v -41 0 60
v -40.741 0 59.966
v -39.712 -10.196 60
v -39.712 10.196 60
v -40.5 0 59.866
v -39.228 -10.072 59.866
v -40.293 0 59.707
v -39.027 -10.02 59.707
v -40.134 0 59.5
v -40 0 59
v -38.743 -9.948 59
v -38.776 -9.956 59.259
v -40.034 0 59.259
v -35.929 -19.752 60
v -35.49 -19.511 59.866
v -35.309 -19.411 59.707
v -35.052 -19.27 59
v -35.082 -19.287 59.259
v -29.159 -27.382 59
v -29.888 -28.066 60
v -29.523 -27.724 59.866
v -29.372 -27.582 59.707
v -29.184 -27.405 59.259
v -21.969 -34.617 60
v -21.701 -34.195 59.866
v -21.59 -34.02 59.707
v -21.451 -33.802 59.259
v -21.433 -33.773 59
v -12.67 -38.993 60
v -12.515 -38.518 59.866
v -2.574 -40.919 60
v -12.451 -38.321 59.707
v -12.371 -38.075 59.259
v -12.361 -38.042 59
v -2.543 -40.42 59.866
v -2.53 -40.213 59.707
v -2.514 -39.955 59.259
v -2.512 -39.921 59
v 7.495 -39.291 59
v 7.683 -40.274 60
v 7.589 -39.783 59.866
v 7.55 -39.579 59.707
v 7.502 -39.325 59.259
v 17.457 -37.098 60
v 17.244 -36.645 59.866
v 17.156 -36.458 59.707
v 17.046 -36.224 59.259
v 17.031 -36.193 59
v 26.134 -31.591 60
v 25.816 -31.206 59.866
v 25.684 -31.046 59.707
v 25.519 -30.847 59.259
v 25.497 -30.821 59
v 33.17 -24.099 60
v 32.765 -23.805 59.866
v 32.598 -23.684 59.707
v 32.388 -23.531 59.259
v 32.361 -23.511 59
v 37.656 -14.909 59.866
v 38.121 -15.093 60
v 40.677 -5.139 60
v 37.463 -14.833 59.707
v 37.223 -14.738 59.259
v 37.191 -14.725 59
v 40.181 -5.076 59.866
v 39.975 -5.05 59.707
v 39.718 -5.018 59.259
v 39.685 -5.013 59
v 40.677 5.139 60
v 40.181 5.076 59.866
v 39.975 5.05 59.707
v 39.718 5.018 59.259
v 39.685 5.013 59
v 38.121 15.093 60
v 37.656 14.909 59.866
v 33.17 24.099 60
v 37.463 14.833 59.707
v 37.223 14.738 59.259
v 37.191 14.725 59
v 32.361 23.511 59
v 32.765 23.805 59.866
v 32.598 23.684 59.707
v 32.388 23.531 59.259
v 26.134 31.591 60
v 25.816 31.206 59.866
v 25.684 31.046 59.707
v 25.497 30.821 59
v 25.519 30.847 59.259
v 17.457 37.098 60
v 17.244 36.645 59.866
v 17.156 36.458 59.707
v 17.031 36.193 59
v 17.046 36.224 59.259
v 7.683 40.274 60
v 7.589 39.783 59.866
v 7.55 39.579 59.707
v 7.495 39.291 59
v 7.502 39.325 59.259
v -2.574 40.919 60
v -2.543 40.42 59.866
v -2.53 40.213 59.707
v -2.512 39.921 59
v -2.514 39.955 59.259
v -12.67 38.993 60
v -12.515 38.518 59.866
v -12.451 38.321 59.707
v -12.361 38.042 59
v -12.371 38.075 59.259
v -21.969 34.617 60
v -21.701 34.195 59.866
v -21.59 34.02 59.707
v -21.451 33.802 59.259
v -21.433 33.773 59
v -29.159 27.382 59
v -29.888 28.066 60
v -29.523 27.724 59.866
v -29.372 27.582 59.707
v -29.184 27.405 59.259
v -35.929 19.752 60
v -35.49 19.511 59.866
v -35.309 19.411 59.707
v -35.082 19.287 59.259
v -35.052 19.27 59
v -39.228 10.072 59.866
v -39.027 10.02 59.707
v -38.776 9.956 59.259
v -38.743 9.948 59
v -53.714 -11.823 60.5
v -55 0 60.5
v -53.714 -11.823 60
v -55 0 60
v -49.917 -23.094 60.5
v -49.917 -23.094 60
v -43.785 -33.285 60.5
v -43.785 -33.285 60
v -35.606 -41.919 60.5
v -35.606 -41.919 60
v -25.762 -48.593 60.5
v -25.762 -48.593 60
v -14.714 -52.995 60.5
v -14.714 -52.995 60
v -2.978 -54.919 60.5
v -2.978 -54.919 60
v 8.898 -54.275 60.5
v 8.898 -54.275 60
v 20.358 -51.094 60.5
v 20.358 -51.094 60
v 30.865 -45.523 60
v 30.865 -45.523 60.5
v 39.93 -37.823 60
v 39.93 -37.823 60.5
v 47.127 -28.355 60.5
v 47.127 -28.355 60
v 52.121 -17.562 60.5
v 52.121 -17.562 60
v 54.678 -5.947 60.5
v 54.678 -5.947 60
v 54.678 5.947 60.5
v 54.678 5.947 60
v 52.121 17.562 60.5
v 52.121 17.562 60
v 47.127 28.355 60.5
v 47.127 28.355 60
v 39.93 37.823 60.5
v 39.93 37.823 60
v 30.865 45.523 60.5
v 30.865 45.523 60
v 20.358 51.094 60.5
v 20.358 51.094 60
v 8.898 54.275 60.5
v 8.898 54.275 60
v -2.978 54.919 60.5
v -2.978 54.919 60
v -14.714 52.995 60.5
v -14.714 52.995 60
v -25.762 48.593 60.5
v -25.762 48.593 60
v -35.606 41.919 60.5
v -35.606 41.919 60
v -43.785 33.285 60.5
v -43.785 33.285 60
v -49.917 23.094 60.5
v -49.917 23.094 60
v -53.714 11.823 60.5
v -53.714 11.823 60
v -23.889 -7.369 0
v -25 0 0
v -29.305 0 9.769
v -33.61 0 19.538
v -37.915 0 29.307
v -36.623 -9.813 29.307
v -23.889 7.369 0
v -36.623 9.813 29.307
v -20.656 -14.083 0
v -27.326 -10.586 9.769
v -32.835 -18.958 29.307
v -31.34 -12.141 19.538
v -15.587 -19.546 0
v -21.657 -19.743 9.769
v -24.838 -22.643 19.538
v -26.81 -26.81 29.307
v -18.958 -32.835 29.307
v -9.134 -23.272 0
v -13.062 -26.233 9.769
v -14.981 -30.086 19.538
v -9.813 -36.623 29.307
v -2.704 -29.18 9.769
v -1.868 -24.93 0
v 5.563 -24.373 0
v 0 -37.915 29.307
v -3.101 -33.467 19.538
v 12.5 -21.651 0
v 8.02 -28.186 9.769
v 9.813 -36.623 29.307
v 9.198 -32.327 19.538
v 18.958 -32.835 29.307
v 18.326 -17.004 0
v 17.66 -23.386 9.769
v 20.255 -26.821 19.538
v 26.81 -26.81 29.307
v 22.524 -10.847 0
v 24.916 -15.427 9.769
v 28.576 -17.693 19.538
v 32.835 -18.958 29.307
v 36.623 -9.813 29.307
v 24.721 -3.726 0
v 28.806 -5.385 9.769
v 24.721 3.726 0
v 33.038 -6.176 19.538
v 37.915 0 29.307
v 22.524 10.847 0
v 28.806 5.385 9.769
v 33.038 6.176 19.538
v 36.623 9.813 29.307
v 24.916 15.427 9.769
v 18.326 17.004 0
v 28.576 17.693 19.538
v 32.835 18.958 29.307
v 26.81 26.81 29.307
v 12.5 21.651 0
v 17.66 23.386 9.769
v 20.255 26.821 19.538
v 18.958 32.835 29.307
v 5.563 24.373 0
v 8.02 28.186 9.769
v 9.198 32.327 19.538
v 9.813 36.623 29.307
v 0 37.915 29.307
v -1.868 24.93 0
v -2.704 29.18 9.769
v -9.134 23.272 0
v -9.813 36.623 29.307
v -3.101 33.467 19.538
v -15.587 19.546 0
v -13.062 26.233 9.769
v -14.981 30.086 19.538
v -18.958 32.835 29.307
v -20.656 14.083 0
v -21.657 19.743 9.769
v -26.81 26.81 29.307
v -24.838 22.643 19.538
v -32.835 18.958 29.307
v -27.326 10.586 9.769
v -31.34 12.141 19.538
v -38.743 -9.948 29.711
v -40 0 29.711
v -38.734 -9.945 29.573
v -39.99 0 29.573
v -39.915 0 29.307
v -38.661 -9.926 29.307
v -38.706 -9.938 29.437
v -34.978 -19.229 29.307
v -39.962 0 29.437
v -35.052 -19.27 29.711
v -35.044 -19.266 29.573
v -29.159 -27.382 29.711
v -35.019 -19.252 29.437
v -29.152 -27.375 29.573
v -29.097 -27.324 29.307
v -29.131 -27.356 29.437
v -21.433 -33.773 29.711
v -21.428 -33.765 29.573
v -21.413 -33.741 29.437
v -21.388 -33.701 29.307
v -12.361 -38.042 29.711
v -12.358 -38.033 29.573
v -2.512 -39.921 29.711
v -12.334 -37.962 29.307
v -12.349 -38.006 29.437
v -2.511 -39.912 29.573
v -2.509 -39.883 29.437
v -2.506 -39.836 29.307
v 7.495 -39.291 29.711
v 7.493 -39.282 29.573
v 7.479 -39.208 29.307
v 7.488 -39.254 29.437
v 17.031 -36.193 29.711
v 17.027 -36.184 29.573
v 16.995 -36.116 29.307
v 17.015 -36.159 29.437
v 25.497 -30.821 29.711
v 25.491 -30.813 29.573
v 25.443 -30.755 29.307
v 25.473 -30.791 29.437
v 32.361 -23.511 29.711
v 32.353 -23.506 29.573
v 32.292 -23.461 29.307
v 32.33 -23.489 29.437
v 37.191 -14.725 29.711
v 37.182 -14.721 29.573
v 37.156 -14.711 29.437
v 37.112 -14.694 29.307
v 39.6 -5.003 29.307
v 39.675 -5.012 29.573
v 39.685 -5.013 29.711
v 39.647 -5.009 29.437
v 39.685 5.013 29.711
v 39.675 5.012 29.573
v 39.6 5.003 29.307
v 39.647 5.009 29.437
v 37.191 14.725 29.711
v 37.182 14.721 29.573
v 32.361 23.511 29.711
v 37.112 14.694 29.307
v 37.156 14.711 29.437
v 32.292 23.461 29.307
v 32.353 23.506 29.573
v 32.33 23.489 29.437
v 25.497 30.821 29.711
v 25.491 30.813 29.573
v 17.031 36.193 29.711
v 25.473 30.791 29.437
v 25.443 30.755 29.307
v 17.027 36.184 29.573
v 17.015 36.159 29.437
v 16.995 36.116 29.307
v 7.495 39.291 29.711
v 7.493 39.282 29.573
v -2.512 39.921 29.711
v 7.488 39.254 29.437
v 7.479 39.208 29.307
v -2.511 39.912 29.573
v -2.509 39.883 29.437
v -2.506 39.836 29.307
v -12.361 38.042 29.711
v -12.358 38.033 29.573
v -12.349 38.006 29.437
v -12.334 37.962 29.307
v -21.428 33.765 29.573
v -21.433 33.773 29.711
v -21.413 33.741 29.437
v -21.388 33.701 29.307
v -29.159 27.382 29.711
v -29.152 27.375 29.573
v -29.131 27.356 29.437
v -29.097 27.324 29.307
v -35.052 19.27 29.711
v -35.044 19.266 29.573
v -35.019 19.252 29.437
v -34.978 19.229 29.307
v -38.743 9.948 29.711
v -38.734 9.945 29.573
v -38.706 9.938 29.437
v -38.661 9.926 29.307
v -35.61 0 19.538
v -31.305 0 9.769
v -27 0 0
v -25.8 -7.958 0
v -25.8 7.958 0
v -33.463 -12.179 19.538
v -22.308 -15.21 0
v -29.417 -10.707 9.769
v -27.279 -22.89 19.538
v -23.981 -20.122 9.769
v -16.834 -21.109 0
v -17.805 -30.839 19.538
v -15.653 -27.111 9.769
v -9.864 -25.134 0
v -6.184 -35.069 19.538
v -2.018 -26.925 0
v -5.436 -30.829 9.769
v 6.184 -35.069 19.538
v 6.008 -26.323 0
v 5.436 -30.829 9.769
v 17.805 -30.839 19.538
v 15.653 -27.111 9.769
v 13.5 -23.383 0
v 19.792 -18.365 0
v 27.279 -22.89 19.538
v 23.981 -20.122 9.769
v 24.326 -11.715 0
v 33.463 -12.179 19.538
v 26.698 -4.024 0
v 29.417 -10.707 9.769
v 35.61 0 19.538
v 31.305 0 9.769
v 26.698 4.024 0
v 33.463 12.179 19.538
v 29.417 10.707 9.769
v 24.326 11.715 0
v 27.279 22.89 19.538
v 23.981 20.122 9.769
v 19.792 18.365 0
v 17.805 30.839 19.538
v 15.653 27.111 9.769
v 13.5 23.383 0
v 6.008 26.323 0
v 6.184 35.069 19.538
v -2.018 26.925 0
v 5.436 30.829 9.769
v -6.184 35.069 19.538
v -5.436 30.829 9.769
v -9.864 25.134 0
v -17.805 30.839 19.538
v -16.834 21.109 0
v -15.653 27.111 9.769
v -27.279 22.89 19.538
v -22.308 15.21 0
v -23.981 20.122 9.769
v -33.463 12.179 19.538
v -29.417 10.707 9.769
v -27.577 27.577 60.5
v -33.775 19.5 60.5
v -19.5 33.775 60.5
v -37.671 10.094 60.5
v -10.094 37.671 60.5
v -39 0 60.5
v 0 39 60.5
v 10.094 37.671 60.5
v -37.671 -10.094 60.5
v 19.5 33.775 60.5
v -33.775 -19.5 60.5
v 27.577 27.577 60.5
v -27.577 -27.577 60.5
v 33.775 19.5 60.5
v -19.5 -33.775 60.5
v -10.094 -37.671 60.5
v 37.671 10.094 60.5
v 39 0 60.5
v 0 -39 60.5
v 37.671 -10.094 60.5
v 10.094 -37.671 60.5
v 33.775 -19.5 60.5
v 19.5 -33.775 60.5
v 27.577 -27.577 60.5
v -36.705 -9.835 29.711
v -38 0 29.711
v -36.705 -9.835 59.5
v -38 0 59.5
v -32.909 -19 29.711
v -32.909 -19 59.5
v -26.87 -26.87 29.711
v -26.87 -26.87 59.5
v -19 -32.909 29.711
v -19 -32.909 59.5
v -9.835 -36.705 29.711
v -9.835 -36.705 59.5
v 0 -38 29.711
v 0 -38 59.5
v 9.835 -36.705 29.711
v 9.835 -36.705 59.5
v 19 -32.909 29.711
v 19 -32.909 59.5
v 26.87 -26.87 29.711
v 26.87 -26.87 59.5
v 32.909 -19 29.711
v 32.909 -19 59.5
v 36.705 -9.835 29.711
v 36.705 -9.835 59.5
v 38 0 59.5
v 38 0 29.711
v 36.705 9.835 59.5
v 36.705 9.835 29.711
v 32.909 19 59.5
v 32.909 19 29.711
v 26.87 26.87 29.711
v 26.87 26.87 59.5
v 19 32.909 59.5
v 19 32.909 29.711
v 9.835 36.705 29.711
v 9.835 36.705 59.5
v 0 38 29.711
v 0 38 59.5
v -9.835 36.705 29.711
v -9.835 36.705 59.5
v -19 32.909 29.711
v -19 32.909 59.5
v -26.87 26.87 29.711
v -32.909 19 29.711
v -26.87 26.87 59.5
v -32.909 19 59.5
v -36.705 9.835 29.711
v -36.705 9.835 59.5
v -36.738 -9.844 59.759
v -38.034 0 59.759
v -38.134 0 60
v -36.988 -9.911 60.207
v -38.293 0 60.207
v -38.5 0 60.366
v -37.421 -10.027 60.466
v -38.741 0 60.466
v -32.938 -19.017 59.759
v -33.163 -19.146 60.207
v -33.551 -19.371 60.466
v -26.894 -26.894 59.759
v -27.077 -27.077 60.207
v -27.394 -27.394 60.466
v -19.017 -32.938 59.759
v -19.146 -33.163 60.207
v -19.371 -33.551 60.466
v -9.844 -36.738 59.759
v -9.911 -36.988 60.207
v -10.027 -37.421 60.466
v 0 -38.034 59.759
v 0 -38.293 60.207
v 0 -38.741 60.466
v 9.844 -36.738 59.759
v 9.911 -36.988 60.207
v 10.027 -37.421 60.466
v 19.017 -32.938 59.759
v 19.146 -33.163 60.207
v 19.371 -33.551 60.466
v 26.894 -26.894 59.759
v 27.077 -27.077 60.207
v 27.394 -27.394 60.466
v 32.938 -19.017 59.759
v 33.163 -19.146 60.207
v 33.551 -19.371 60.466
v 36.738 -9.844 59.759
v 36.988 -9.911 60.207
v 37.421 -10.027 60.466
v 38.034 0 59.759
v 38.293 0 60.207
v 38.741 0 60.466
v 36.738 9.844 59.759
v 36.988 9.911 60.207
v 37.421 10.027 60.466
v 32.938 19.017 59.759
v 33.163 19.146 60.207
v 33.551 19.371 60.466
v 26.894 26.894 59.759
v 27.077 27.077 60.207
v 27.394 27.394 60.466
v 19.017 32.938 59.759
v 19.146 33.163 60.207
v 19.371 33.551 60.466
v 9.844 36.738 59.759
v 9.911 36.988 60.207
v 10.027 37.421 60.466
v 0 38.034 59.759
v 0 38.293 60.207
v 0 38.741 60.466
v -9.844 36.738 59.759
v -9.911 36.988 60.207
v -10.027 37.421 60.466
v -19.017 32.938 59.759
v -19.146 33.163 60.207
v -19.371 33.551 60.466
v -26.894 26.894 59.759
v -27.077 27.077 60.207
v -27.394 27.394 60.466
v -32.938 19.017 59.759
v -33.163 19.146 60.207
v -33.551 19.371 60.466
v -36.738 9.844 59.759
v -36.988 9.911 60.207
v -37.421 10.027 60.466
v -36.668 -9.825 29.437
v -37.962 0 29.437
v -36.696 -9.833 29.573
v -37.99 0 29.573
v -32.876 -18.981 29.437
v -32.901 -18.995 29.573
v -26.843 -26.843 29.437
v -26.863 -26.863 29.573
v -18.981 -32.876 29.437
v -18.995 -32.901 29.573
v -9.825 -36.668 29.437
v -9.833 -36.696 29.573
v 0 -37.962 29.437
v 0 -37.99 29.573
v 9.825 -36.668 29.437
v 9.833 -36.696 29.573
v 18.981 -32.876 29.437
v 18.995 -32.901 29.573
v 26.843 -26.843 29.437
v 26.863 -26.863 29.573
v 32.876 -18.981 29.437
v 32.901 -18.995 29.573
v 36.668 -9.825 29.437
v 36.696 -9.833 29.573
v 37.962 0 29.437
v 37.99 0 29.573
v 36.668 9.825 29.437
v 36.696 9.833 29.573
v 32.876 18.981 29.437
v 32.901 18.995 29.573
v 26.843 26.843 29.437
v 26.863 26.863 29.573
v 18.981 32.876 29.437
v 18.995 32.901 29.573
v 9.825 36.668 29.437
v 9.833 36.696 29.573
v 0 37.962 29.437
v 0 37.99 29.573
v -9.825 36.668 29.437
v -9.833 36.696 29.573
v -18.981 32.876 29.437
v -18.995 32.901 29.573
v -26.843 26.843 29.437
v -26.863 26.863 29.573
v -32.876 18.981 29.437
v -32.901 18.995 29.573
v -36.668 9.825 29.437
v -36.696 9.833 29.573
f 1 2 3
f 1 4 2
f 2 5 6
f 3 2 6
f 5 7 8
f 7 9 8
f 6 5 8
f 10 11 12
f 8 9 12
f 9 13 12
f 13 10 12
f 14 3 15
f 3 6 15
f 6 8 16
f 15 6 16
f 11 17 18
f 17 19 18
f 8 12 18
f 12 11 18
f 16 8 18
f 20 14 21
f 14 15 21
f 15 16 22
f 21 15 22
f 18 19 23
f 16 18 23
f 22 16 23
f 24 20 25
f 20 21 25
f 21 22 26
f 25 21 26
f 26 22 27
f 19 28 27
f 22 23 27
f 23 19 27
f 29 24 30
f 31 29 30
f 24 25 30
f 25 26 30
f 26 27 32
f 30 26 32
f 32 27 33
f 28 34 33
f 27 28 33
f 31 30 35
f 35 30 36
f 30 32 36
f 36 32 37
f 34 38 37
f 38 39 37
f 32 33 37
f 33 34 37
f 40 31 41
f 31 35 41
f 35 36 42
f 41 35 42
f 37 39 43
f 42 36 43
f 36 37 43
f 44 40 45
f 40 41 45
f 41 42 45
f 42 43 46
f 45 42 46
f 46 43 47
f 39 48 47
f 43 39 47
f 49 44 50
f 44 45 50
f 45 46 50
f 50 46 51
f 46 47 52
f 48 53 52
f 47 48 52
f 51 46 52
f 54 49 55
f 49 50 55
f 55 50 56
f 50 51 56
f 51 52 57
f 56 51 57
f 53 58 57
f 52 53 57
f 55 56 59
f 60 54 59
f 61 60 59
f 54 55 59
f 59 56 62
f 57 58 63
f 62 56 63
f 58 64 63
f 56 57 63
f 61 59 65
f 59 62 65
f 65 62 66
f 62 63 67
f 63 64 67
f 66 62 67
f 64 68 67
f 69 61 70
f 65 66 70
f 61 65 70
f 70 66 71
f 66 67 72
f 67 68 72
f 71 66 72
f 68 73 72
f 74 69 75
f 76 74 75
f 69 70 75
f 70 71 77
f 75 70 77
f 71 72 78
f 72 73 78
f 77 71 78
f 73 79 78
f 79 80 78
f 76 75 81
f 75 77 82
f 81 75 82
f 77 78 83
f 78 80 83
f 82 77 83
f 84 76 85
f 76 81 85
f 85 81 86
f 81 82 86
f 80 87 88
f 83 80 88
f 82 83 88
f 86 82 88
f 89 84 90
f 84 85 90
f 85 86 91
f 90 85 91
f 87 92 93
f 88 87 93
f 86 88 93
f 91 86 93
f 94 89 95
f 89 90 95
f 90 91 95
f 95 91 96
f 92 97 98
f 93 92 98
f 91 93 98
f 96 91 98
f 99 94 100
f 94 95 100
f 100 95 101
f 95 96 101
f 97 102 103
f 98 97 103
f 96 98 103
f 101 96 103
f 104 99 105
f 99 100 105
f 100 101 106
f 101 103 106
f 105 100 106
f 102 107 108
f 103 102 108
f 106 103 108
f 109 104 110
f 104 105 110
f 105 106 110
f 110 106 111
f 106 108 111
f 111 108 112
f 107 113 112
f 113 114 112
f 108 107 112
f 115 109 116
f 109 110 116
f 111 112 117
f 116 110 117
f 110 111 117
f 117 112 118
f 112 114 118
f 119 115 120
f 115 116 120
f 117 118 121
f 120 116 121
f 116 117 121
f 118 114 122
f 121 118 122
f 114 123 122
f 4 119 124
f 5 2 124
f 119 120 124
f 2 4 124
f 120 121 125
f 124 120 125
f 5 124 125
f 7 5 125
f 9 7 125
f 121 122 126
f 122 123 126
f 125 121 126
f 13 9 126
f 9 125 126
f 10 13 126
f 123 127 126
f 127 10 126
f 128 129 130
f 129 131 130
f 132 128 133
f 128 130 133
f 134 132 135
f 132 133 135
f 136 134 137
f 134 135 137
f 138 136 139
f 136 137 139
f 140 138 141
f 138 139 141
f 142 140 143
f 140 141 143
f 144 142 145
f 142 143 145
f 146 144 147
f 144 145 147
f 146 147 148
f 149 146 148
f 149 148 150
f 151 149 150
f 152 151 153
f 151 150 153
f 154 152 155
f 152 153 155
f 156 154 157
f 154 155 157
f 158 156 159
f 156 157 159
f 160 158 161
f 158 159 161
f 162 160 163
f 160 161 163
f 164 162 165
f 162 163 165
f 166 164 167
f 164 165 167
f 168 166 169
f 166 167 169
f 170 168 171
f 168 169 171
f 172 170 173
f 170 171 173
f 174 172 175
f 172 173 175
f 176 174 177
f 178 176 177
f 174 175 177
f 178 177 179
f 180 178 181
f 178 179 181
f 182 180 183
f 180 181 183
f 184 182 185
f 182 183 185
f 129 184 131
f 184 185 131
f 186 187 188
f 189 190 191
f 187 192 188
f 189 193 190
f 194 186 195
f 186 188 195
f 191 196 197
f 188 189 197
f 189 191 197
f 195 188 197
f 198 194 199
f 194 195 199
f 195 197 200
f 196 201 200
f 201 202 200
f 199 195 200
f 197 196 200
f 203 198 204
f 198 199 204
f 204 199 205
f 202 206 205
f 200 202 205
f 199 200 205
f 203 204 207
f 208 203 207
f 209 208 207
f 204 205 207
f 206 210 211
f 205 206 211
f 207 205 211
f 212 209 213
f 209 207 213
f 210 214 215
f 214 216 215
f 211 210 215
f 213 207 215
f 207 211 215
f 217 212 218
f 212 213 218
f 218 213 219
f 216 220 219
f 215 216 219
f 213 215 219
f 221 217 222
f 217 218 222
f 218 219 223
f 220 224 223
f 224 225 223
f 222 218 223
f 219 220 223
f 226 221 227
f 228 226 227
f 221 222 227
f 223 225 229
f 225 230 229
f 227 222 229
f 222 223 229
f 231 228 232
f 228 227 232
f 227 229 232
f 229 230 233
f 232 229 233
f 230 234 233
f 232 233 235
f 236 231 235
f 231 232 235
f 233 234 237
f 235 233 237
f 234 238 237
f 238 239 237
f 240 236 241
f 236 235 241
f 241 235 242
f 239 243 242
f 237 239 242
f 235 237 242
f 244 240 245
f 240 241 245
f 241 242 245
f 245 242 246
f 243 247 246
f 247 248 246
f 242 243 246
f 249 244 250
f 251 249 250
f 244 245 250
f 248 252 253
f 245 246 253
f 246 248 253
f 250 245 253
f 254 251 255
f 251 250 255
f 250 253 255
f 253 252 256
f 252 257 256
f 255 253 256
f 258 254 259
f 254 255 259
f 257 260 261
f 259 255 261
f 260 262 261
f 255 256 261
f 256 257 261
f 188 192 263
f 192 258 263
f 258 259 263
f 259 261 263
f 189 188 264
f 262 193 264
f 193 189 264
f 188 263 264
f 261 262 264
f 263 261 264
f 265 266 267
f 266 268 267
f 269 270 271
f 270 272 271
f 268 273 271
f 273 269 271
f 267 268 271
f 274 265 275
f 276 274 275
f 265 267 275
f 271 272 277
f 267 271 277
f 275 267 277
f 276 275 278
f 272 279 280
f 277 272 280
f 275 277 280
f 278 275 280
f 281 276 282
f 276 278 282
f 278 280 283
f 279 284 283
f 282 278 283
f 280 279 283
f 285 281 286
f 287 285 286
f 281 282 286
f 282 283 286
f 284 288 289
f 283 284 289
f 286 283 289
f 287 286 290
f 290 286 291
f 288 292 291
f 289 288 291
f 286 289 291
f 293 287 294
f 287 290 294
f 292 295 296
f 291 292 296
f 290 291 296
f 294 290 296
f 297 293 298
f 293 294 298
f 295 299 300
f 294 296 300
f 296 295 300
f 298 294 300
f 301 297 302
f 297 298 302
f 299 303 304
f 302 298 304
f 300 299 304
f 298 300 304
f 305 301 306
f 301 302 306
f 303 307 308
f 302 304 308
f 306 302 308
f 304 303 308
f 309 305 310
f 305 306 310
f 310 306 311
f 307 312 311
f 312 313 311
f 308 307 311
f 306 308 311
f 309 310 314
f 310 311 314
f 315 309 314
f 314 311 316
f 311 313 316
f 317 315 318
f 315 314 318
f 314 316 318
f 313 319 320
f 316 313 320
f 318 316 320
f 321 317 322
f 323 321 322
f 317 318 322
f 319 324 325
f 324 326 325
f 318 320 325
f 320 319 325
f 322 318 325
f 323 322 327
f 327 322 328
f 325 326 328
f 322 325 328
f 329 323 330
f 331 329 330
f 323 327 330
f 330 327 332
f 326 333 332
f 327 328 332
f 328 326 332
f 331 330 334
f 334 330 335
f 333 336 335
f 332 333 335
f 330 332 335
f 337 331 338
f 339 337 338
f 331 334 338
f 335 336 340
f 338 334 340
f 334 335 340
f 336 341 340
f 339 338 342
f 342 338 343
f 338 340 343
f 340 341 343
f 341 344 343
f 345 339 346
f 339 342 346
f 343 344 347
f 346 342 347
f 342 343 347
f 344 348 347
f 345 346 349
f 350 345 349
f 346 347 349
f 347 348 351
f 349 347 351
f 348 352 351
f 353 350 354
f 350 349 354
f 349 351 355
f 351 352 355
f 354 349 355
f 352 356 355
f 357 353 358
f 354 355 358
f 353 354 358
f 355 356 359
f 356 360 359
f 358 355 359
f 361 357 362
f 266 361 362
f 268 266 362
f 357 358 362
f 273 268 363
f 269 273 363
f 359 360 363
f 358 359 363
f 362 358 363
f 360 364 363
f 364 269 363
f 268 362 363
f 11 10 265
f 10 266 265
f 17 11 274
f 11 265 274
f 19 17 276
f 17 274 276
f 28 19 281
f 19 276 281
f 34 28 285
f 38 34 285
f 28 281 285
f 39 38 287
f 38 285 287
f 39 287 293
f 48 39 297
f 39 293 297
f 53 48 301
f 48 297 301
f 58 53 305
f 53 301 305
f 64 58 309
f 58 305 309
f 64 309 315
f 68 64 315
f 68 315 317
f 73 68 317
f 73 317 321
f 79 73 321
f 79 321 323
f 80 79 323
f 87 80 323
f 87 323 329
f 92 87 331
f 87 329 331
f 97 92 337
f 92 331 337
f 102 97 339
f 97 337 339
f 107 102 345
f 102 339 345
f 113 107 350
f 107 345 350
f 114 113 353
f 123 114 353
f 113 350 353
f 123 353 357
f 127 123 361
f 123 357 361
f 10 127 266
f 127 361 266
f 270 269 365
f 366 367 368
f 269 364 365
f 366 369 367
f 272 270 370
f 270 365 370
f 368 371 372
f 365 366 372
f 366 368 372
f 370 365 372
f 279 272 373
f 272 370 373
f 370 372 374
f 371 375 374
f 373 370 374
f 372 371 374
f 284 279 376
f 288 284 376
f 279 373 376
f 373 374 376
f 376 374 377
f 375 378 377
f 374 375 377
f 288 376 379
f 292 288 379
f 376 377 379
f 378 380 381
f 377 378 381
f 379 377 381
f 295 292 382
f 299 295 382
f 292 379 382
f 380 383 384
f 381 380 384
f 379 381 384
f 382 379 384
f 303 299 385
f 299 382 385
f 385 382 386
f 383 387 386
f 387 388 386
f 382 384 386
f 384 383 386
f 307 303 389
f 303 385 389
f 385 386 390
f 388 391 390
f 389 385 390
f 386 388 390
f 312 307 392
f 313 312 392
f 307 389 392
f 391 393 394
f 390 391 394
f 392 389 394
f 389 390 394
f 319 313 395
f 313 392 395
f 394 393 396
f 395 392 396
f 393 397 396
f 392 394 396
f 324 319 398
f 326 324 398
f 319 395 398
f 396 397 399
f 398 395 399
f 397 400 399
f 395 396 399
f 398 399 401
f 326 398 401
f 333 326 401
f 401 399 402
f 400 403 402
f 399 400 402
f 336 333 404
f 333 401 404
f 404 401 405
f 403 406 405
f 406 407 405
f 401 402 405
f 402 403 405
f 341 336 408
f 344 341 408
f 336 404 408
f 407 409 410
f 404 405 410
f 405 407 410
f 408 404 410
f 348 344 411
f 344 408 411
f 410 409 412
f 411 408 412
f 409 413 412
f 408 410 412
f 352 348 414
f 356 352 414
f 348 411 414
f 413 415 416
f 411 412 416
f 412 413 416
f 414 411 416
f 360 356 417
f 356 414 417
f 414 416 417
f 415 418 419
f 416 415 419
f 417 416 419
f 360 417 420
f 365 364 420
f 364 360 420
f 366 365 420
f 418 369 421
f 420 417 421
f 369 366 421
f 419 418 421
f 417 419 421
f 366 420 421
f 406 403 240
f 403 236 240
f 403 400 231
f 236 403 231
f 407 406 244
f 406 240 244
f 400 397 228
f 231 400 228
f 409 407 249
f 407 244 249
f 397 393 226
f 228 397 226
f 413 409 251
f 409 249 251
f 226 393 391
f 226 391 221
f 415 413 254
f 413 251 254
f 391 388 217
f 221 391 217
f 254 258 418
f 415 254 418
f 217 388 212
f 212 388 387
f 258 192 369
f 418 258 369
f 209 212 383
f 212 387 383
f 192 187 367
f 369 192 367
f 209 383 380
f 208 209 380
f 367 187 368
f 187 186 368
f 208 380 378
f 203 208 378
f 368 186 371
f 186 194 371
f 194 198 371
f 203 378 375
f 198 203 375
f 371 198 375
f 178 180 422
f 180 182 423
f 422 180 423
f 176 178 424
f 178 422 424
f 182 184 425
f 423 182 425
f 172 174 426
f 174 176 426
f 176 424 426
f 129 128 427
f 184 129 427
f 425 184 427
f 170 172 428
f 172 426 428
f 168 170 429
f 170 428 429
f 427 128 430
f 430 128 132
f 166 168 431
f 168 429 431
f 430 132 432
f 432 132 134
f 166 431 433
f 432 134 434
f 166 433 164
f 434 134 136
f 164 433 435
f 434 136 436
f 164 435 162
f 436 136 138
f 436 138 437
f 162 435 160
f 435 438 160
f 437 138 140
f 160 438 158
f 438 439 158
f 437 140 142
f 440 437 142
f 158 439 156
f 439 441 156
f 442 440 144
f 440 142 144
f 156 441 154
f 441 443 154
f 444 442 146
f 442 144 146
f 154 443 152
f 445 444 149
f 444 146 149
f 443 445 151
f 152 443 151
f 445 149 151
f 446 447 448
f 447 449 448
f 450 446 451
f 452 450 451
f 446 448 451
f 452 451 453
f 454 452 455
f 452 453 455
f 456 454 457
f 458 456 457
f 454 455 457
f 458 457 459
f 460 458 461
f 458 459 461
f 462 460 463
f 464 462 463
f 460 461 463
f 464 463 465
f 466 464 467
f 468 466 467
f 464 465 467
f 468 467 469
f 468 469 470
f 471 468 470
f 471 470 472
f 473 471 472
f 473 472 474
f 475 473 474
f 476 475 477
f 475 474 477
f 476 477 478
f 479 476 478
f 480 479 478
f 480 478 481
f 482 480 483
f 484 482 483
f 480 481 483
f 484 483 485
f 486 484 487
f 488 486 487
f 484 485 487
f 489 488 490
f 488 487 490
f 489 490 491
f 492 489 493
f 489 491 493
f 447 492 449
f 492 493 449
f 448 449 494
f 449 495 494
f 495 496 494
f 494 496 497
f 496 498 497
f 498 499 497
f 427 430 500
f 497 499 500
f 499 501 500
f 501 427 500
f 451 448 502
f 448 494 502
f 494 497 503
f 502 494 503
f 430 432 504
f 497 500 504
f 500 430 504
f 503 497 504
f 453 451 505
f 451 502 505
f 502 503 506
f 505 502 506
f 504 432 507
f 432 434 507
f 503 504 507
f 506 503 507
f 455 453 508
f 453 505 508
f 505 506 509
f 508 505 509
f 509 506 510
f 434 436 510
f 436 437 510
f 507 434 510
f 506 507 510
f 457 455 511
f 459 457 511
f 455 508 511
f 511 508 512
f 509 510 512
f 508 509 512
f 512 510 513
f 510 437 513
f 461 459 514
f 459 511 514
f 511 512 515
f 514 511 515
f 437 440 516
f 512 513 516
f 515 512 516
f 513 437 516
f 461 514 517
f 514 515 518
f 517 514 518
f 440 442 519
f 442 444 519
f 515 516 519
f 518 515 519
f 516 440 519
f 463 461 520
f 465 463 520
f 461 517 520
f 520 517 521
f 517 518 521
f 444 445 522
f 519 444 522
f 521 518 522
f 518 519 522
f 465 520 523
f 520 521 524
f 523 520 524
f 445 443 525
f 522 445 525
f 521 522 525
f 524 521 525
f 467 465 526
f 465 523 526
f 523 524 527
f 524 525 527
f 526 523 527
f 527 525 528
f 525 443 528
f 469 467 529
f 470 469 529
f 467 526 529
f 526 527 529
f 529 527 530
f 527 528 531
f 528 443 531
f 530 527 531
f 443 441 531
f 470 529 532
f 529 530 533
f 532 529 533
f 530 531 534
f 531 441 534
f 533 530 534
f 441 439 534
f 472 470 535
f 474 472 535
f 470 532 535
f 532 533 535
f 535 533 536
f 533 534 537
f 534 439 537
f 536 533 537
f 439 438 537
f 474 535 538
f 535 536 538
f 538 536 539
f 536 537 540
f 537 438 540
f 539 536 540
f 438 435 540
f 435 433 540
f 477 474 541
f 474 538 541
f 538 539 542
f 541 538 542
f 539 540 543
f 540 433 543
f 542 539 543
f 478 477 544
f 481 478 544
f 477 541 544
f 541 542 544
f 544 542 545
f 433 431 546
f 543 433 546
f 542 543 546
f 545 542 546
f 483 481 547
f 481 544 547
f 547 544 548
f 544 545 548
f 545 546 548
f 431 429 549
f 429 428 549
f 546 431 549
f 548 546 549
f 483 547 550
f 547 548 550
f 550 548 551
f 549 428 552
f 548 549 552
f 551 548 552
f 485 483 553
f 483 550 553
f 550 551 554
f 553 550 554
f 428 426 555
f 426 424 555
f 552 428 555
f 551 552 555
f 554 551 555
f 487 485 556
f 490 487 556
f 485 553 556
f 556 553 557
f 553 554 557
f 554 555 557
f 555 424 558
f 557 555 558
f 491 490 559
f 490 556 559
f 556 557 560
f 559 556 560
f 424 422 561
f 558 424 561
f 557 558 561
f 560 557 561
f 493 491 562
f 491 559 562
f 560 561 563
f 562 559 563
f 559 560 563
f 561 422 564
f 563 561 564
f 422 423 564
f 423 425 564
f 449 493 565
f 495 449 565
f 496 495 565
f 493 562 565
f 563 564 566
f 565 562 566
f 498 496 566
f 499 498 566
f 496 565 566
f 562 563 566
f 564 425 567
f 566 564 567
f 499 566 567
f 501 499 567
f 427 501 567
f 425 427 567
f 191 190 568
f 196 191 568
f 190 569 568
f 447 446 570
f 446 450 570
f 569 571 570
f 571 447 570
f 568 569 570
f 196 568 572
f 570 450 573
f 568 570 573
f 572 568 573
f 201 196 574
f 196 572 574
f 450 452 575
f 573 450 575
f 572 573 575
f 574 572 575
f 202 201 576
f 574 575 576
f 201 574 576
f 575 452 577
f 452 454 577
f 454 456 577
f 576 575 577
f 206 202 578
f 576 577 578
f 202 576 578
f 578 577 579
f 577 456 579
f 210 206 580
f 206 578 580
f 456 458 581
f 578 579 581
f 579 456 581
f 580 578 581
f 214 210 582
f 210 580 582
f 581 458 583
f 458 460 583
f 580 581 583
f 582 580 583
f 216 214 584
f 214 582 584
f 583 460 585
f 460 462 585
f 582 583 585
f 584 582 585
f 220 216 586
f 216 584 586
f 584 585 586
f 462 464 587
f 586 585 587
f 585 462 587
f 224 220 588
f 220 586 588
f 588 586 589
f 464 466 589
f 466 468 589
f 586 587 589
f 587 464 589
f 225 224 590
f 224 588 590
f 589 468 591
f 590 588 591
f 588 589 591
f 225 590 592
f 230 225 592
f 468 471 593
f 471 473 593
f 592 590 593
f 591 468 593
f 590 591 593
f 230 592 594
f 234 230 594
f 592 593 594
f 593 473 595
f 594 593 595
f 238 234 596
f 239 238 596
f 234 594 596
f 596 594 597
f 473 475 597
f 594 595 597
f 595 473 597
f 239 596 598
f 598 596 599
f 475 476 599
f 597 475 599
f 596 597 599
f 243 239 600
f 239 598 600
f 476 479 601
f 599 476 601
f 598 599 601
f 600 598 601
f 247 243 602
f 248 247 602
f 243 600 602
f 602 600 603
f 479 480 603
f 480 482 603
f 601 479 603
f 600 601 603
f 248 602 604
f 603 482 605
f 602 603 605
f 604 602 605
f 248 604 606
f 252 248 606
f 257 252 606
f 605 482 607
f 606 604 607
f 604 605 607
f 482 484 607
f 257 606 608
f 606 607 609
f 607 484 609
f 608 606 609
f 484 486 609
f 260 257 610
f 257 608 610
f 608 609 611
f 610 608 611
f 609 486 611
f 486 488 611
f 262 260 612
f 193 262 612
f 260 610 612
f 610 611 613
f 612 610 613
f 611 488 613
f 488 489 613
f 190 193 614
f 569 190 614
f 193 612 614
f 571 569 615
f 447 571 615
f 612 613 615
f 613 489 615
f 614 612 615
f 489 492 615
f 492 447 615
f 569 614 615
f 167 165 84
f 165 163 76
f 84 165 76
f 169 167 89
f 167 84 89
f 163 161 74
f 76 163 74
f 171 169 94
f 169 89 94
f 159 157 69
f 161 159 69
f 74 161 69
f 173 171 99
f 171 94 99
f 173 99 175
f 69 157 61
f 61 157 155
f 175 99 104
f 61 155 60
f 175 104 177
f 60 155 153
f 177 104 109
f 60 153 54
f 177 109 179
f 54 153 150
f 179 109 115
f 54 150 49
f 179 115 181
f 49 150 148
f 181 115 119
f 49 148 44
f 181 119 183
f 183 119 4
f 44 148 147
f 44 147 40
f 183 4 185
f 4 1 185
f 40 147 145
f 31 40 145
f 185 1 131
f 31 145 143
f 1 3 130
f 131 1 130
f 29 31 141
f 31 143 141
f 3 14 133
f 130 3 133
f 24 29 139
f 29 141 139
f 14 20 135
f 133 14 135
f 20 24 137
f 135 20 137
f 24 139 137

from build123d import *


# Not quite as in the source:
# - a feature names something its author has since deleted; it is built from what else it names


with BuildPart() as f1:
    # F0 (on Front) → F1 (revolve)
    with BuildSketch(Plane.XZ):
        with BuildLine():
            Line((-55, 60), (-41, 60))
            ThreePointArc((-41, 60), (-40.2928932188, 59.7071067812), (-40, 59))
            Line((-40, 59), (-40, 29.71056928))
            ThreePointArc((-40, 29.71056928), (-39.9785413088, 29.5045185412), (-39.9150861861, 29.3073109607))
            Line((-39.9150861861, 29.3073109607), (-27, 0))
            Line((-27, 0), (-25, 0))
            Line((-25, 0), (-37.9150861861, 29.3073109607))
            ThreePointArc((-37.9150861861, 29.3073109607), (-37.9785413088, 29.5045185412), (-38, 29.71056928))
            Line((-38, 29.71056928), (-38, 59.5))
            ThreePointArc((-38, 59.5), (-38.2928932188, 60.2071067812), (-39, 60.5))
            Line((-39, 60.5), (-55, 60.5))
            Line((-55, 60.5), (-55, 60))
        make_face()
    revolve(axis=Axis((0, 0, 19.5262523685), (0, 0, 1)))


solid = f1.part
